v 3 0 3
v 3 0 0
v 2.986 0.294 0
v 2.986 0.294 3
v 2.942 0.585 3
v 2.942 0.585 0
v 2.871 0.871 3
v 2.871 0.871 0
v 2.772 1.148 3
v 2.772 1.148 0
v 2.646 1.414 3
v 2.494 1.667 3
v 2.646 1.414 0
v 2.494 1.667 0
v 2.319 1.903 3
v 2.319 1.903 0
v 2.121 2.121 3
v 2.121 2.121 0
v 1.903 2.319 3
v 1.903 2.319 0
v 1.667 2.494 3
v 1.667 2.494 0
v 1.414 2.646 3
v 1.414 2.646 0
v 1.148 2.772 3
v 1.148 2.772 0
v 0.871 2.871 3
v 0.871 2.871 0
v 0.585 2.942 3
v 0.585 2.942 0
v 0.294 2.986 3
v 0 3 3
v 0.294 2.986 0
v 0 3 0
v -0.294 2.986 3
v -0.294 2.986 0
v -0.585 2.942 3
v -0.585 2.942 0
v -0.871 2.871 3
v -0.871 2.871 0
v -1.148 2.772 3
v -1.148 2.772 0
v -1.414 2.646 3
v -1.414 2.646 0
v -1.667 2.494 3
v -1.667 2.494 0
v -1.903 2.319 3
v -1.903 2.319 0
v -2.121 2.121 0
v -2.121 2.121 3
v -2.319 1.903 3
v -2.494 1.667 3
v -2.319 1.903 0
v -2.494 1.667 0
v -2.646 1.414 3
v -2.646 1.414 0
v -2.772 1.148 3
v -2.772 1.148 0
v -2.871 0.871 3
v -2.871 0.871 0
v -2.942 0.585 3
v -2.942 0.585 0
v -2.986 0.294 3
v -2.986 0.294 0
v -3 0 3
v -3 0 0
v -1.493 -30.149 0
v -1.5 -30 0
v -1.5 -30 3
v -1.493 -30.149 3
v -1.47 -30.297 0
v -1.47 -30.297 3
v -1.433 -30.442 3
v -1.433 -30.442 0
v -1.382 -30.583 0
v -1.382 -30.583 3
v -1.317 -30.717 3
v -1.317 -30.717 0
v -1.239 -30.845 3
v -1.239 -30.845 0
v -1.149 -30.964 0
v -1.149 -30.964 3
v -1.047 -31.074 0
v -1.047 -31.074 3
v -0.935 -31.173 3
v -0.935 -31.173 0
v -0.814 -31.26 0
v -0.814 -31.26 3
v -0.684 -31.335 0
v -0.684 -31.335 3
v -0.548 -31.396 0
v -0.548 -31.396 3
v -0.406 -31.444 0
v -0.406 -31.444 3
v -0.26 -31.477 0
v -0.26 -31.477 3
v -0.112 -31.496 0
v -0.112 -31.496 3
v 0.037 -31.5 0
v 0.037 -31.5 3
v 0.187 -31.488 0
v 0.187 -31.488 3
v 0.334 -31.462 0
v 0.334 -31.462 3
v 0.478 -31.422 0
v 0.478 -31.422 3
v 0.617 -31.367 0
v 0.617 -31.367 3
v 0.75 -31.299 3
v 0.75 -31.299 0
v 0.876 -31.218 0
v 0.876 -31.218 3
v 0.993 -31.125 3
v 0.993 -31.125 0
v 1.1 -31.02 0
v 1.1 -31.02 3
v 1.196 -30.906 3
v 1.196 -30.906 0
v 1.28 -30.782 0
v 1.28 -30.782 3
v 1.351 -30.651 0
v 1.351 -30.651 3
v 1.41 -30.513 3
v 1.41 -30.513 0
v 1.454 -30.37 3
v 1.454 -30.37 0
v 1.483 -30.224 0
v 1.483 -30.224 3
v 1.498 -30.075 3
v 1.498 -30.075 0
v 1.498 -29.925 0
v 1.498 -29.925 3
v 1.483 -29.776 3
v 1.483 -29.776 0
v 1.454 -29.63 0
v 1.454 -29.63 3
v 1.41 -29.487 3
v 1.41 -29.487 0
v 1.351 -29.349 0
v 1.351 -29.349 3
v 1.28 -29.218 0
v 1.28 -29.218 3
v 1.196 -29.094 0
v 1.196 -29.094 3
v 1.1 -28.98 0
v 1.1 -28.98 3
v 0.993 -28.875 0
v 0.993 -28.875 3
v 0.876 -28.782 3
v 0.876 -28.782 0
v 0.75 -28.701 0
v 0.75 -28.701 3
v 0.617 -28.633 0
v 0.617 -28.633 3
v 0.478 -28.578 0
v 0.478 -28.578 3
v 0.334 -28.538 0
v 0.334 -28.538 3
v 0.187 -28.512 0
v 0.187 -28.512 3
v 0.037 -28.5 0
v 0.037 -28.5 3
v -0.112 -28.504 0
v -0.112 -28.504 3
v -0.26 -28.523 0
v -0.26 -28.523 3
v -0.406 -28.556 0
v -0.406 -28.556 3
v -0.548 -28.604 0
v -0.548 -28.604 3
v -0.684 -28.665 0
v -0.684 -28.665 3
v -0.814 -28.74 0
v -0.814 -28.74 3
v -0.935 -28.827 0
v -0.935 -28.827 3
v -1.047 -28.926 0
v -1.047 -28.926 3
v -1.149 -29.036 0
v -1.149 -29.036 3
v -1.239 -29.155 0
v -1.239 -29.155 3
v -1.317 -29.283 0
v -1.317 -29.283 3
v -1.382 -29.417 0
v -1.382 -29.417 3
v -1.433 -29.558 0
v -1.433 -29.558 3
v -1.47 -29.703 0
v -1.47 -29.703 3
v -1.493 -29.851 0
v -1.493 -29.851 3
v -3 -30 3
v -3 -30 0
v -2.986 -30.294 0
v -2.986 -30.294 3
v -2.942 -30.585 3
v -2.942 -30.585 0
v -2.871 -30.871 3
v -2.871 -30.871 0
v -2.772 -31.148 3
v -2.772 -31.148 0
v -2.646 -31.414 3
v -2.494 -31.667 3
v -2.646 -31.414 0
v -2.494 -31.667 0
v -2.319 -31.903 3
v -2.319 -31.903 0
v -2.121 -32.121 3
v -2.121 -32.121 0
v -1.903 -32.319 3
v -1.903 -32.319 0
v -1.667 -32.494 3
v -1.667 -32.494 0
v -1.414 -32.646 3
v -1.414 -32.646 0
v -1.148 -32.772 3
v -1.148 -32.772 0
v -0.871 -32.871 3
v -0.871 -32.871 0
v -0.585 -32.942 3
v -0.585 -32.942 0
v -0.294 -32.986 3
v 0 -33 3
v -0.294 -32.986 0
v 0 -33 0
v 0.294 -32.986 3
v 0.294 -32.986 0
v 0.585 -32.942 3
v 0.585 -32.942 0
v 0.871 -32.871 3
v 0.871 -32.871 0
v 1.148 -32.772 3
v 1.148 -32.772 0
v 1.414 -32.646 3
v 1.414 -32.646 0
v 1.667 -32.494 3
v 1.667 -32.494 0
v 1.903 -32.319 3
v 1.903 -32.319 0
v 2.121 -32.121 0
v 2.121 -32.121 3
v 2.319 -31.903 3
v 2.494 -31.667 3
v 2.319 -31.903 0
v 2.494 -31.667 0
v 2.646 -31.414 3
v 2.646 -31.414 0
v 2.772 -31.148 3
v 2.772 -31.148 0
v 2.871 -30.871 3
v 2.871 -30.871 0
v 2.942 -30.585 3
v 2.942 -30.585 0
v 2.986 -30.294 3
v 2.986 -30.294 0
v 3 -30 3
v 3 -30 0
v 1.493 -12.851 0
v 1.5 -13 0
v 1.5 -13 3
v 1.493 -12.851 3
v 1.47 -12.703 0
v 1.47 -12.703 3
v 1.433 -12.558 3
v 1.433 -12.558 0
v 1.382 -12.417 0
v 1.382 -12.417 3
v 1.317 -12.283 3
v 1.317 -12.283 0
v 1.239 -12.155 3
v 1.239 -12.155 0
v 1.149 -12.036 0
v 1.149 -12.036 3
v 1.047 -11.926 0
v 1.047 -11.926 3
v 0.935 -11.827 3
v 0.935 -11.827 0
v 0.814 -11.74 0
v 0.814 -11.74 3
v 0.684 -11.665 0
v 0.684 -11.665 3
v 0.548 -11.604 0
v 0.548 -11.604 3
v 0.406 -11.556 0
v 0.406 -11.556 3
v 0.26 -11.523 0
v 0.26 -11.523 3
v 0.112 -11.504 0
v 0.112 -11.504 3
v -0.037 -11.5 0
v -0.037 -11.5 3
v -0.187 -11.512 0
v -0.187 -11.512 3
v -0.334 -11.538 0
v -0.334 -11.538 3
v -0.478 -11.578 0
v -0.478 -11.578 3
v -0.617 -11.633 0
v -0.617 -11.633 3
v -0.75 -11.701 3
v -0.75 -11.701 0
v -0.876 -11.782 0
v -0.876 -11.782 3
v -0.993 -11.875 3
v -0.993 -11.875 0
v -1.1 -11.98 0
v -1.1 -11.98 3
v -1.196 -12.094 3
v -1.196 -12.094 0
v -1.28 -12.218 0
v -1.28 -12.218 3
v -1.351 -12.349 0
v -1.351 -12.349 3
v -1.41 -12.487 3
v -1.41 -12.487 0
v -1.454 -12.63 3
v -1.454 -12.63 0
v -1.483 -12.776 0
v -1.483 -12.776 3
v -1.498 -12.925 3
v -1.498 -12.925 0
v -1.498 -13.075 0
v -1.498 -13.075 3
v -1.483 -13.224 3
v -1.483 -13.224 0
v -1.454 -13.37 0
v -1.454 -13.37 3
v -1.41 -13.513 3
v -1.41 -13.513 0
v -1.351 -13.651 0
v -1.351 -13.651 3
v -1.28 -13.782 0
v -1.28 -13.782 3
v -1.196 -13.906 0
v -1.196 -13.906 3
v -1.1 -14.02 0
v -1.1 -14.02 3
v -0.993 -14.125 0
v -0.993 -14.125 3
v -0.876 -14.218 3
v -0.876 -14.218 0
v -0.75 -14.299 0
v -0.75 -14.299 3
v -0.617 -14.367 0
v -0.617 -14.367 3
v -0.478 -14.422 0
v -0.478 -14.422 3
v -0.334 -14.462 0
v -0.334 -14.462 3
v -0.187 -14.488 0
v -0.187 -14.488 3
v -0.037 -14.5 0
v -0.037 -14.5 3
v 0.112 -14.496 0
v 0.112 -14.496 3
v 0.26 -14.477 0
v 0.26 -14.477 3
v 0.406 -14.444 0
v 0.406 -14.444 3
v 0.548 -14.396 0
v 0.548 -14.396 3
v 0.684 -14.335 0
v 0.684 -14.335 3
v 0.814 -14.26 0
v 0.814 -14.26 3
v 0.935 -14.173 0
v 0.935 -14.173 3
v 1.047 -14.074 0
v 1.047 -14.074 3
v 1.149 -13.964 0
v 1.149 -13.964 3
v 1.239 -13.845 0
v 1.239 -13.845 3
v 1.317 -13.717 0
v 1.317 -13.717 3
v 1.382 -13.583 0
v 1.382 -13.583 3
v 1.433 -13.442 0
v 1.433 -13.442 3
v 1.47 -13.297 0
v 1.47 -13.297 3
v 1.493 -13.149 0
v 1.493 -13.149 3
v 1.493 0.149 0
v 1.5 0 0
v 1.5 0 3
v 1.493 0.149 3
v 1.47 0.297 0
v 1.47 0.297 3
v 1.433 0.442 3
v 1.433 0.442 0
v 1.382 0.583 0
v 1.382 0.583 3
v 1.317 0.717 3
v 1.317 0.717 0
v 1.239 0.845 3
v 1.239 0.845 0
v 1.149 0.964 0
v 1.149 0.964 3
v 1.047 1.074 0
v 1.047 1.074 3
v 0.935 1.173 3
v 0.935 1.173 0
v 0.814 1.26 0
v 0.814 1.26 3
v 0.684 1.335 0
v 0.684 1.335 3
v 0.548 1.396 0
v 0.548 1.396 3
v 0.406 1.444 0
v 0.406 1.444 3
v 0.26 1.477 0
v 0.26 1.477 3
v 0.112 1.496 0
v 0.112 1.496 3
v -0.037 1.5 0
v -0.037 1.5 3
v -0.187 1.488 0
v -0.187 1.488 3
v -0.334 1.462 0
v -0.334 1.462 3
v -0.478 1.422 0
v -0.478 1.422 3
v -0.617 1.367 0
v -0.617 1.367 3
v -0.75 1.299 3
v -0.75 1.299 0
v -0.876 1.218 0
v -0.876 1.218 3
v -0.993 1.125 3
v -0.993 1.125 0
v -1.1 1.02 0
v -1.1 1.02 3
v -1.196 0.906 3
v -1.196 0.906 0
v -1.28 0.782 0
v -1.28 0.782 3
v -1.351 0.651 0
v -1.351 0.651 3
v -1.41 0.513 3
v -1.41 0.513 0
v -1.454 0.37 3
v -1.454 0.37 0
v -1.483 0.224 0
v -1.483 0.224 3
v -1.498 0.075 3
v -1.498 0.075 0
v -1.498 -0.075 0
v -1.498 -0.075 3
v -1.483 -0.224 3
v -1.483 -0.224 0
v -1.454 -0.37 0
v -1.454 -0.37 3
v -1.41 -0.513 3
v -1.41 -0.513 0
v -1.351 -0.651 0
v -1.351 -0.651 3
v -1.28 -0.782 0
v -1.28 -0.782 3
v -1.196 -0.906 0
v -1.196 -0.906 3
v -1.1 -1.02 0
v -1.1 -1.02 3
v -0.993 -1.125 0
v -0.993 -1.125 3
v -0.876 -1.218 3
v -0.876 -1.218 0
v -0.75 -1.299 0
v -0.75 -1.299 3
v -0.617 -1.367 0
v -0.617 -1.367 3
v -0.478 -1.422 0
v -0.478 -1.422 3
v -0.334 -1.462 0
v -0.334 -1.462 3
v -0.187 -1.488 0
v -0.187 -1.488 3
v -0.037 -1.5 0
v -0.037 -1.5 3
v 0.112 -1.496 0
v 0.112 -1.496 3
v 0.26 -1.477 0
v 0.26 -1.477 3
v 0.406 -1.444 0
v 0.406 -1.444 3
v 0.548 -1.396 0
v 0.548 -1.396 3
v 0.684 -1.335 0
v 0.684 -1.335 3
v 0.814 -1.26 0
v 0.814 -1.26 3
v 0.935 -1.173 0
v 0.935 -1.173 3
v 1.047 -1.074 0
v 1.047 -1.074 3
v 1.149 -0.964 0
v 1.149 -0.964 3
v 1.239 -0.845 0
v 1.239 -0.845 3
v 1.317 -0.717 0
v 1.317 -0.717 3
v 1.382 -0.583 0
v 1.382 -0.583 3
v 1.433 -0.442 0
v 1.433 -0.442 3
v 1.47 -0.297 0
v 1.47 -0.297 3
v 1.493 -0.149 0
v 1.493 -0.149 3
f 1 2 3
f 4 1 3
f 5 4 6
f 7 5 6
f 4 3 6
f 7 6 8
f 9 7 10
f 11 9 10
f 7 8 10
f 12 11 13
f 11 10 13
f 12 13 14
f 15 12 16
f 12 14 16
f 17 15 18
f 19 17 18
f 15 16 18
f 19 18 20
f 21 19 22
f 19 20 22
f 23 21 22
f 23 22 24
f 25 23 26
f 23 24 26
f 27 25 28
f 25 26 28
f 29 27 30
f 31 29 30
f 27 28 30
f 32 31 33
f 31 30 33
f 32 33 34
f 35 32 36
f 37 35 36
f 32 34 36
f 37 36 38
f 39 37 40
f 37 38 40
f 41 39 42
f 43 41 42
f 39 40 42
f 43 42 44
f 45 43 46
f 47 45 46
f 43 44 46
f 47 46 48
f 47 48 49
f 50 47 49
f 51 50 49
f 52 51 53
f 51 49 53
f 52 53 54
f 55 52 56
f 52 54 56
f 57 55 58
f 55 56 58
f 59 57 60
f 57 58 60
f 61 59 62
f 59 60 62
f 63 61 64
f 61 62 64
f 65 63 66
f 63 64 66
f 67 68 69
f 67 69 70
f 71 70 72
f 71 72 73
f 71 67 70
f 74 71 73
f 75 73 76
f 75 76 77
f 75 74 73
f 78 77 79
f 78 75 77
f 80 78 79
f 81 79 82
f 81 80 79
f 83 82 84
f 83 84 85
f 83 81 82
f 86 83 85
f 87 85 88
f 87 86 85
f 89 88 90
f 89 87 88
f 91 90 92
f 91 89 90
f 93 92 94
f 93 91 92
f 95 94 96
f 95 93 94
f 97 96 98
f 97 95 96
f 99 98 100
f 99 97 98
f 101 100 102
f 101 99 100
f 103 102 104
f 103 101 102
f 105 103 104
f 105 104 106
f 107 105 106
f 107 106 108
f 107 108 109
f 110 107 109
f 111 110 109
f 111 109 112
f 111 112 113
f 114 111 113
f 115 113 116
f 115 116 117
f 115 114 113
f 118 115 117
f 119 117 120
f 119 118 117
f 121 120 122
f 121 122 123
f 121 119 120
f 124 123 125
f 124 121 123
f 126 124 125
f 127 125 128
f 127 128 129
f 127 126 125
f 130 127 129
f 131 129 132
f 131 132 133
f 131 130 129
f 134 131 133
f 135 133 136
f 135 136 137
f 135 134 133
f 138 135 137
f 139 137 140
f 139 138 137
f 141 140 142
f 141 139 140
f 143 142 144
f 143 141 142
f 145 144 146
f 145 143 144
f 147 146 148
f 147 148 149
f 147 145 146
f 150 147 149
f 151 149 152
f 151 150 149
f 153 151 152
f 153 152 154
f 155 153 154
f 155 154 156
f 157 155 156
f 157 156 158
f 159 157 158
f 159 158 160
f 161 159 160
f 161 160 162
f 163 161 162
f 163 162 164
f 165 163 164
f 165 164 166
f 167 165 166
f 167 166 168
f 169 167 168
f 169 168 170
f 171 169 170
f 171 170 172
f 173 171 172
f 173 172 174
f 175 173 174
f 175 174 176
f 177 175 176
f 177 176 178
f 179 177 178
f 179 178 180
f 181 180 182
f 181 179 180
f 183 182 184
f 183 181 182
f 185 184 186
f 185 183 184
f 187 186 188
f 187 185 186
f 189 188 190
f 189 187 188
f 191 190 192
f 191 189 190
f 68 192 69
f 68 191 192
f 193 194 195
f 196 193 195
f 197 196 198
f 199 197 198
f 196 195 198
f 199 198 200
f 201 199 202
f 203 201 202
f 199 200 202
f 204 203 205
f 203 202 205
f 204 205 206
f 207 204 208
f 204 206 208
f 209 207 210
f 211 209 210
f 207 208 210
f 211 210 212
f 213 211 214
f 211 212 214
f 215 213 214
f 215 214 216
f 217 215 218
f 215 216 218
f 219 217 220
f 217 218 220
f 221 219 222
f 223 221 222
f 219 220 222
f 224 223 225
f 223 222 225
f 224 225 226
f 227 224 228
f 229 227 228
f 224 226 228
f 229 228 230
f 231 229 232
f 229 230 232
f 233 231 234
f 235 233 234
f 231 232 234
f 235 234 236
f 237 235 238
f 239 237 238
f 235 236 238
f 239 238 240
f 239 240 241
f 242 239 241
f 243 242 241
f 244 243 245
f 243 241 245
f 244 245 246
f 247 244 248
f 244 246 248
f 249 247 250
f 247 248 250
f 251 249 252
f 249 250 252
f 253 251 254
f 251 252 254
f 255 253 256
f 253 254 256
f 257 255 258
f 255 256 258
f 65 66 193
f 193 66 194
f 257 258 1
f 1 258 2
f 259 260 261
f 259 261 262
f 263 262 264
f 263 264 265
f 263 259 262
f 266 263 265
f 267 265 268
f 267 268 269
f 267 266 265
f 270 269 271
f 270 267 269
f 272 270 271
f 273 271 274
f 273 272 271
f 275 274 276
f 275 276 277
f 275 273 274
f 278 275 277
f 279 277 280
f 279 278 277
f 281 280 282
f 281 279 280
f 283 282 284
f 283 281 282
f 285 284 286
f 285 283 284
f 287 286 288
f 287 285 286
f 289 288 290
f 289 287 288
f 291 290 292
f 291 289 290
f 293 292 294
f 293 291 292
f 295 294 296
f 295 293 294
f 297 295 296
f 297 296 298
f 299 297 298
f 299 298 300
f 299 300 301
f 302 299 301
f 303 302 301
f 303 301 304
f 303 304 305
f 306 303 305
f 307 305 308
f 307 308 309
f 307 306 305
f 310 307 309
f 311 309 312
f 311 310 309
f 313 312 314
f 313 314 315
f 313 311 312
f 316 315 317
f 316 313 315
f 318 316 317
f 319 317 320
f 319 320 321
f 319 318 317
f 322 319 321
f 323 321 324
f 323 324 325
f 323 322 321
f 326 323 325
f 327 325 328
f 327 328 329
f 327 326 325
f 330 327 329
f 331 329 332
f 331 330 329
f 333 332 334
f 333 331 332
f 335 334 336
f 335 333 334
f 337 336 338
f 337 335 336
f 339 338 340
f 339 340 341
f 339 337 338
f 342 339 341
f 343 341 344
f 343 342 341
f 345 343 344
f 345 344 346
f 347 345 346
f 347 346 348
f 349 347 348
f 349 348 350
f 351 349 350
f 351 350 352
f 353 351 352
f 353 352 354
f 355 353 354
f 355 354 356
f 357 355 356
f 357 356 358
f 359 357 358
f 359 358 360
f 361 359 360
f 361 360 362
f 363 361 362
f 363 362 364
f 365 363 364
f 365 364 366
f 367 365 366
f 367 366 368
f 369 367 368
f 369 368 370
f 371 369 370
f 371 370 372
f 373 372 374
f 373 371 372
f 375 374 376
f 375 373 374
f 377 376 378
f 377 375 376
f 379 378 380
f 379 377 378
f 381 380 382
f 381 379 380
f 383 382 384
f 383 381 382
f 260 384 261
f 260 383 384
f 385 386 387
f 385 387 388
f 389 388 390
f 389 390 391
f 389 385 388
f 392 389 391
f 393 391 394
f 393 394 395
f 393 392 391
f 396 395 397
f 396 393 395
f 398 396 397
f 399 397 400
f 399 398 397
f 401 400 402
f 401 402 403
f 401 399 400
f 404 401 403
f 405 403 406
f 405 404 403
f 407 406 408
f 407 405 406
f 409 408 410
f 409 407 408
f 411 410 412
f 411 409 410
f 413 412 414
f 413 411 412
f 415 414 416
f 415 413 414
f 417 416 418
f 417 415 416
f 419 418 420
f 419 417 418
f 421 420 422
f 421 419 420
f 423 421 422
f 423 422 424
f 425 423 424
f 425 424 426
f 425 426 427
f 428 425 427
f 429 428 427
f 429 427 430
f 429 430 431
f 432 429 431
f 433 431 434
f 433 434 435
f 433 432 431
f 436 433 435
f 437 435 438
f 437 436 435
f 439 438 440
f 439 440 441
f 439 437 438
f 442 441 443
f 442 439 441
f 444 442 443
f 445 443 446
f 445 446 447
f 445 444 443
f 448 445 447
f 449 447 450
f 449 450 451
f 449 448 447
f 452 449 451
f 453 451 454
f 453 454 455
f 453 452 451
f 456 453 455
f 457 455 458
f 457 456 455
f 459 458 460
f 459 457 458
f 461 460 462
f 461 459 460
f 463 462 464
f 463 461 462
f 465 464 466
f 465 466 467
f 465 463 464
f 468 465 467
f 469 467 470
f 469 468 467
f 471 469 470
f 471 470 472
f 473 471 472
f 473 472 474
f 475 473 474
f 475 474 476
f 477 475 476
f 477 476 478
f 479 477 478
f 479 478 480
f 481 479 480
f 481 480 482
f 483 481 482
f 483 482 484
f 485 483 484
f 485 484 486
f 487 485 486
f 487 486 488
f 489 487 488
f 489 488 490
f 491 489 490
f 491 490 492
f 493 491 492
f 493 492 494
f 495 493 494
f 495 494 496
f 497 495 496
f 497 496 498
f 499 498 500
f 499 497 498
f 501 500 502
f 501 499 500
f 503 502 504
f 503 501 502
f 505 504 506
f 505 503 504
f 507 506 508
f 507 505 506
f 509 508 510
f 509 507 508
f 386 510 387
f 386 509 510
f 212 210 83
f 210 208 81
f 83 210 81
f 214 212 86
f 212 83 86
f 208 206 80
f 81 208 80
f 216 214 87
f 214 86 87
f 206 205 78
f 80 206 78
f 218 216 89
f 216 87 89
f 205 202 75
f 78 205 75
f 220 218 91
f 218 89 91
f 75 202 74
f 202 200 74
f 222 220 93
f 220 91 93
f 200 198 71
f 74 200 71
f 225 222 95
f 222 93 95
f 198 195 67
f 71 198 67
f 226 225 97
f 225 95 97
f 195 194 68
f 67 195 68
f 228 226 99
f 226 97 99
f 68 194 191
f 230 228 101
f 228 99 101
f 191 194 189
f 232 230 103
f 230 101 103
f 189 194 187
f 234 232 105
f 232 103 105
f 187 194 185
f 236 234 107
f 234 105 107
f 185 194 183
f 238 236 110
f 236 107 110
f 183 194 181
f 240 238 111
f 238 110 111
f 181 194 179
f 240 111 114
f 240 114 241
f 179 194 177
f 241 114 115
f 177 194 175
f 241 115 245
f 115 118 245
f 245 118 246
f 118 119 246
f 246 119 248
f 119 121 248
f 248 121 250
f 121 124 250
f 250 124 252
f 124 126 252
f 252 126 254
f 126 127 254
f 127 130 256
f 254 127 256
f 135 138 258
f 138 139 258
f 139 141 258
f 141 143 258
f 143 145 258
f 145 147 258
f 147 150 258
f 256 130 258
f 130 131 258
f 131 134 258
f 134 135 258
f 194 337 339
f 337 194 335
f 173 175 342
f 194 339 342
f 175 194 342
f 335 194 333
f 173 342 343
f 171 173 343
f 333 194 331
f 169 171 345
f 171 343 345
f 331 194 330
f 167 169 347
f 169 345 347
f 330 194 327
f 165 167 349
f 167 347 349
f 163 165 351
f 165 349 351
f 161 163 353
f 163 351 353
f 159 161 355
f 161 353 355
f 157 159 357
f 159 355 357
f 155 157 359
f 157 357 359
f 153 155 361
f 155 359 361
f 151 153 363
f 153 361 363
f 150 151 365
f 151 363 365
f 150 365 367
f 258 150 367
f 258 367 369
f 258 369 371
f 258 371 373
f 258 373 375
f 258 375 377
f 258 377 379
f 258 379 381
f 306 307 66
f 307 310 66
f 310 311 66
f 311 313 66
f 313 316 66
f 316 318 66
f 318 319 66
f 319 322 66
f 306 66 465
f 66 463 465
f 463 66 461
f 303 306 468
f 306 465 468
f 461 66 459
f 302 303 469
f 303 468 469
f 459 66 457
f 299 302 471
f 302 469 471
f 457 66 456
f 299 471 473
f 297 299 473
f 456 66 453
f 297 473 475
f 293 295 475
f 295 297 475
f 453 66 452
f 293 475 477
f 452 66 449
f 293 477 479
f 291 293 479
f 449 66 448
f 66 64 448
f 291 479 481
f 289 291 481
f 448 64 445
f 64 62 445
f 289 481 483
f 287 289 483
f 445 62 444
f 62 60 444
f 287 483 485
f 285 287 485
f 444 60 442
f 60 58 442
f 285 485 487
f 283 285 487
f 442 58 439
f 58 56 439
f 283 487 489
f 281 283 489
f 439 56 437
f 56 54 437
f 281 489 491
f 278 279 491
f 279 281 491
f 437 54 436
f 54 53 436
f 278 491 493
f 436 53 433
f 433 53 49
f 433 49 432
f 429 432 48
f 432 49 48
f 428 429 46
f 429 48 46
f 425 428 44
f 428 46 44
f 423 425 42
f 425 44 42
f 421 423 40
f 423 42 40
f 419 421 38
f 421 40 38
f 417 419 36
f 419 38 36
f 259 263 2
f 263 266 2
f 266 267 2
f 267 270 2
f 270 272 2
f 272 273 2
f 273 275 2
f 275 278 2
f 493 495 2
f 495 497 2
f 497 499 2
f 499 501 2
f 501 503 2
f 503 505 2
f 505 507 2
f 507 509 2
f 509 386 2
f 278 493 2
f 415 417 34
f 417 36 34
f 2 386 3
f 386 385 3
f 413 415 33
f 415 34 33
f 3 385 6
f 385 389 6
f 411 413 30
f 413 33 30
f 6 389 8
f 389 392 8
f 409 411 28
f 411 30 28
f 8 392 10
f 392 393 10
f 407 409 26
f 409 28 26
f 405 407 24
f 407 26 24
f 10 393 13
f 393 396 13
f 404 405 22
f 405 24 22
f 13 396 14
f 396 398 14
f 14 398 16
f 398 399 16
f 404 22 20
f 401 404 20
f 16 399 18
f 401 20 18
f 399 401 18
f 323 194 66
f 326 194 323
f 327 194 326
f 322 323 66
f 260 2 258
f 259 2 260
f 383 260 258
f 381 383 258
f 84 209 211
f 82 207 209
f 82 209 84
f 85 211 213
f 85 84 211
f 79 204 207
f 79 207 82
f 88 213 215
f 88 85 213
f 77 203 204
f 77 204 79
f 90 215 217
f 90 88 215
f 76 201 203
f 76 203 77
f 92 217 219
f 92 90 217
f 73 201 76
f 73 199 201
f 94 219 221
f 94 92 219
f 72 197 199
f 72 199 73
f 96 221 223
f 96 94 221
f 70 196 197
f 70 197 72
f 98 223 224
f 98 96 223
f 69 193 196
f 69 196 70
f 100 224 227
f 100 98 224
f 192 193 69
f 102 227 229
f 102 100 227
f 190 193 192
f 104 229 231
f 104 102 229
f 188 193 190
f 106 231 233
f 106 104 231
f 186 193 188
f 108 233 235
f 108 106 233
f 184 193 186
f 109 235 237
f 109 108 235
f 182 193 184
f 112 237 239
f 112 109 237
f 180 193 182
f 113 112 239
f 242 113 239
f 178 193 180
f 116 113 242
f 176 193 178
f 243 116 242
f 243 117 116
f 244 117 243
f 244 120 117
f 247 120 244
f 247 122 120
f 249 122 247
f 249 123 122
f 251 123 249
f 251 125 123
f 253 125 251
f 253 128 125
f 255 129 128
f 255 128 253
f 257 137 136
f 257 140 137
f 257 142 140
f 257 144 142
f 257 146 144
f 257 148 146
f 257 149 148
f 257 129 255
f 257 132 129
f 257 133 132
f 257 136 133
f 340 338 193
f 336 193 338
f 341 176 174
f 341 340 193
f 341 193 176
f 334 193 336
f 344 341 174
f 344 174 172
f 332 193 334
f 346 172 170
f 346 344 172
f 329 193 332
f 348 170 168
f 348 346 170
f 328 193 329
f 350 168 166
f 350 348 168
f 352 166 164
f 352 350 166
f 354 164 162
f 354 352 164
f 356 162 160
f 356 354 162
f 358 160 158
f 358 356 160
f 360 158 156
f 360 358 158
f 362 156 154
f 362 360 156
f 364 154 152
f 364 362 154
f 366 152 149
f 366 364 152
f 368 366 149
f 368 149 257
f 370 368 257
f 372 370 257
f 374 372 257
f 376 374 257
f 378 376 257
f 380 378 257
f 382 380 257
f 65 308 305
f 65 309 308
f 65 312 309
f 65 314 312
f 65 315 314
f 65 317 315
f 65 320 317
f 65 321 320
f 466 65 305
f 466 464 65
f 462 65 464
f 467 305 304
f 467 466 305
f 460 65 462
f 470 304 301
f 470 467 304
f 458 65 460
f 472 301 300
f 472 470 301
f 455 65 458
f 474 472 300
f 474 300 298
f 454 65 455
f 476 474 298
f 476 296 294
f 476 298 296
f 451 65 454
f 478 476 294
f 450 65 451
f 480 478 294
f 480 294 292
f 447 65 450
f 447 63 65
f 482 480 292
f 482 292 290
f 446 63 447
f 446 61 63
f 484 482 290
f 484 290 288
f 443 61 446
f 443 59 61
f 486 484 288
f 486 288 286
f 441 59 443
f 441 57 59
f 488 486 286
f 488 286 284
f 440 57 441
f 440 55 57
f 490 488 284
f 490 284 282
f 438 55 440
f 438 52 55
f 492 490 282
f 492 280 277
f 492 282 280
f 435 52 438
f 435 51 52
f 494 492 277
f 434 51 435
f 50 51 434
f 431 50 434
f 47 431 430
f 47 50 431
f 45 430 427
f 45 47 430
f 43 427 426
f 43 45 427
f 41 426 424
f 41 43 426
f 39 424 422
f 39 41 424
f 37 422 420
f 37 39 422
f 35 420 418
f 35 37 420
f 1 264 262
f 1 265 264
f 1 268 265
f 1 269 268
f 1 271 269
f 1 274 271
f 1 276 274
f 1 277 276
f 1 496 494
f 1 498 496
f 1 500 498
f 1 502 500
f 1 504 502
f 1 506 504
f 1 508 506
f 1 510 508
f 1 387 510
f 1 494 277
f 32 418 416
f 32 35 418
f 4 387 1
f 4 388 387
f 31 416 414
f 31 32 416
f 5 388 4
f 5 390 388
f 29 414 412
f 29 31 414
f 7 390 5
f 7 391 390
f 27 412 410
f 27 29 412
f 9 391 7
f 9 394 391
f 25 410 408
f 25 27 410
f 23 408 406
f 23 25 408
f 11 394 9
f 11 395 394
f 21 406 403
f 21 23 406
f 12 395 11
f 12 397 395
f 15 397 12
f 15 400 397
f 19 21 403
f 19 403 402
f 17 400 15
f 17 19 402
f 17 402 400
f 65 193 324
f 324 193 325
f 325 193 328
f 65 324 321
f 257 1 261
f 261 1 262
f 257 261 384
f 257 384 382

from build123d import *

# Parameters (mm, degrees)
SKETCH_1_R      = 1.5
EXTRUDE_1_DEPTH = 3


with BuildPart() as part:
    # ｽｹｯﾁ1 → ﾎﾞｽ - 押し出し1 (new body)
    with BuildSketch(Plane.XY):
        with BuildLine():
            Line((-3, 0), (-3, -30))
            ThreePointArc((-3, -30), (0, -33), (3, -30))
            Line((3, -30), (3, -12))
            Line((3, -12), (3, -8))
            Line((3, -8), (3, 0))
            ThreePointArc((3, 0), (0, 3), (-3, 0))
        make_face()
        Circle(SKETCH_1_R, mode=Mode.SUBTRACT)
        with Locations(Location((0, -30, 0), (0, 0, 180))):
            Circle(SKETCH_1_R, mode=Mode.SUBTRACT)
        with Locations((0, -13)):
            Circle(SKETCH_1_R, mode=Mode.SUBTRACT)
    extrude(amount=EXTRUDE_1_DEPTH)


solid = part.part
